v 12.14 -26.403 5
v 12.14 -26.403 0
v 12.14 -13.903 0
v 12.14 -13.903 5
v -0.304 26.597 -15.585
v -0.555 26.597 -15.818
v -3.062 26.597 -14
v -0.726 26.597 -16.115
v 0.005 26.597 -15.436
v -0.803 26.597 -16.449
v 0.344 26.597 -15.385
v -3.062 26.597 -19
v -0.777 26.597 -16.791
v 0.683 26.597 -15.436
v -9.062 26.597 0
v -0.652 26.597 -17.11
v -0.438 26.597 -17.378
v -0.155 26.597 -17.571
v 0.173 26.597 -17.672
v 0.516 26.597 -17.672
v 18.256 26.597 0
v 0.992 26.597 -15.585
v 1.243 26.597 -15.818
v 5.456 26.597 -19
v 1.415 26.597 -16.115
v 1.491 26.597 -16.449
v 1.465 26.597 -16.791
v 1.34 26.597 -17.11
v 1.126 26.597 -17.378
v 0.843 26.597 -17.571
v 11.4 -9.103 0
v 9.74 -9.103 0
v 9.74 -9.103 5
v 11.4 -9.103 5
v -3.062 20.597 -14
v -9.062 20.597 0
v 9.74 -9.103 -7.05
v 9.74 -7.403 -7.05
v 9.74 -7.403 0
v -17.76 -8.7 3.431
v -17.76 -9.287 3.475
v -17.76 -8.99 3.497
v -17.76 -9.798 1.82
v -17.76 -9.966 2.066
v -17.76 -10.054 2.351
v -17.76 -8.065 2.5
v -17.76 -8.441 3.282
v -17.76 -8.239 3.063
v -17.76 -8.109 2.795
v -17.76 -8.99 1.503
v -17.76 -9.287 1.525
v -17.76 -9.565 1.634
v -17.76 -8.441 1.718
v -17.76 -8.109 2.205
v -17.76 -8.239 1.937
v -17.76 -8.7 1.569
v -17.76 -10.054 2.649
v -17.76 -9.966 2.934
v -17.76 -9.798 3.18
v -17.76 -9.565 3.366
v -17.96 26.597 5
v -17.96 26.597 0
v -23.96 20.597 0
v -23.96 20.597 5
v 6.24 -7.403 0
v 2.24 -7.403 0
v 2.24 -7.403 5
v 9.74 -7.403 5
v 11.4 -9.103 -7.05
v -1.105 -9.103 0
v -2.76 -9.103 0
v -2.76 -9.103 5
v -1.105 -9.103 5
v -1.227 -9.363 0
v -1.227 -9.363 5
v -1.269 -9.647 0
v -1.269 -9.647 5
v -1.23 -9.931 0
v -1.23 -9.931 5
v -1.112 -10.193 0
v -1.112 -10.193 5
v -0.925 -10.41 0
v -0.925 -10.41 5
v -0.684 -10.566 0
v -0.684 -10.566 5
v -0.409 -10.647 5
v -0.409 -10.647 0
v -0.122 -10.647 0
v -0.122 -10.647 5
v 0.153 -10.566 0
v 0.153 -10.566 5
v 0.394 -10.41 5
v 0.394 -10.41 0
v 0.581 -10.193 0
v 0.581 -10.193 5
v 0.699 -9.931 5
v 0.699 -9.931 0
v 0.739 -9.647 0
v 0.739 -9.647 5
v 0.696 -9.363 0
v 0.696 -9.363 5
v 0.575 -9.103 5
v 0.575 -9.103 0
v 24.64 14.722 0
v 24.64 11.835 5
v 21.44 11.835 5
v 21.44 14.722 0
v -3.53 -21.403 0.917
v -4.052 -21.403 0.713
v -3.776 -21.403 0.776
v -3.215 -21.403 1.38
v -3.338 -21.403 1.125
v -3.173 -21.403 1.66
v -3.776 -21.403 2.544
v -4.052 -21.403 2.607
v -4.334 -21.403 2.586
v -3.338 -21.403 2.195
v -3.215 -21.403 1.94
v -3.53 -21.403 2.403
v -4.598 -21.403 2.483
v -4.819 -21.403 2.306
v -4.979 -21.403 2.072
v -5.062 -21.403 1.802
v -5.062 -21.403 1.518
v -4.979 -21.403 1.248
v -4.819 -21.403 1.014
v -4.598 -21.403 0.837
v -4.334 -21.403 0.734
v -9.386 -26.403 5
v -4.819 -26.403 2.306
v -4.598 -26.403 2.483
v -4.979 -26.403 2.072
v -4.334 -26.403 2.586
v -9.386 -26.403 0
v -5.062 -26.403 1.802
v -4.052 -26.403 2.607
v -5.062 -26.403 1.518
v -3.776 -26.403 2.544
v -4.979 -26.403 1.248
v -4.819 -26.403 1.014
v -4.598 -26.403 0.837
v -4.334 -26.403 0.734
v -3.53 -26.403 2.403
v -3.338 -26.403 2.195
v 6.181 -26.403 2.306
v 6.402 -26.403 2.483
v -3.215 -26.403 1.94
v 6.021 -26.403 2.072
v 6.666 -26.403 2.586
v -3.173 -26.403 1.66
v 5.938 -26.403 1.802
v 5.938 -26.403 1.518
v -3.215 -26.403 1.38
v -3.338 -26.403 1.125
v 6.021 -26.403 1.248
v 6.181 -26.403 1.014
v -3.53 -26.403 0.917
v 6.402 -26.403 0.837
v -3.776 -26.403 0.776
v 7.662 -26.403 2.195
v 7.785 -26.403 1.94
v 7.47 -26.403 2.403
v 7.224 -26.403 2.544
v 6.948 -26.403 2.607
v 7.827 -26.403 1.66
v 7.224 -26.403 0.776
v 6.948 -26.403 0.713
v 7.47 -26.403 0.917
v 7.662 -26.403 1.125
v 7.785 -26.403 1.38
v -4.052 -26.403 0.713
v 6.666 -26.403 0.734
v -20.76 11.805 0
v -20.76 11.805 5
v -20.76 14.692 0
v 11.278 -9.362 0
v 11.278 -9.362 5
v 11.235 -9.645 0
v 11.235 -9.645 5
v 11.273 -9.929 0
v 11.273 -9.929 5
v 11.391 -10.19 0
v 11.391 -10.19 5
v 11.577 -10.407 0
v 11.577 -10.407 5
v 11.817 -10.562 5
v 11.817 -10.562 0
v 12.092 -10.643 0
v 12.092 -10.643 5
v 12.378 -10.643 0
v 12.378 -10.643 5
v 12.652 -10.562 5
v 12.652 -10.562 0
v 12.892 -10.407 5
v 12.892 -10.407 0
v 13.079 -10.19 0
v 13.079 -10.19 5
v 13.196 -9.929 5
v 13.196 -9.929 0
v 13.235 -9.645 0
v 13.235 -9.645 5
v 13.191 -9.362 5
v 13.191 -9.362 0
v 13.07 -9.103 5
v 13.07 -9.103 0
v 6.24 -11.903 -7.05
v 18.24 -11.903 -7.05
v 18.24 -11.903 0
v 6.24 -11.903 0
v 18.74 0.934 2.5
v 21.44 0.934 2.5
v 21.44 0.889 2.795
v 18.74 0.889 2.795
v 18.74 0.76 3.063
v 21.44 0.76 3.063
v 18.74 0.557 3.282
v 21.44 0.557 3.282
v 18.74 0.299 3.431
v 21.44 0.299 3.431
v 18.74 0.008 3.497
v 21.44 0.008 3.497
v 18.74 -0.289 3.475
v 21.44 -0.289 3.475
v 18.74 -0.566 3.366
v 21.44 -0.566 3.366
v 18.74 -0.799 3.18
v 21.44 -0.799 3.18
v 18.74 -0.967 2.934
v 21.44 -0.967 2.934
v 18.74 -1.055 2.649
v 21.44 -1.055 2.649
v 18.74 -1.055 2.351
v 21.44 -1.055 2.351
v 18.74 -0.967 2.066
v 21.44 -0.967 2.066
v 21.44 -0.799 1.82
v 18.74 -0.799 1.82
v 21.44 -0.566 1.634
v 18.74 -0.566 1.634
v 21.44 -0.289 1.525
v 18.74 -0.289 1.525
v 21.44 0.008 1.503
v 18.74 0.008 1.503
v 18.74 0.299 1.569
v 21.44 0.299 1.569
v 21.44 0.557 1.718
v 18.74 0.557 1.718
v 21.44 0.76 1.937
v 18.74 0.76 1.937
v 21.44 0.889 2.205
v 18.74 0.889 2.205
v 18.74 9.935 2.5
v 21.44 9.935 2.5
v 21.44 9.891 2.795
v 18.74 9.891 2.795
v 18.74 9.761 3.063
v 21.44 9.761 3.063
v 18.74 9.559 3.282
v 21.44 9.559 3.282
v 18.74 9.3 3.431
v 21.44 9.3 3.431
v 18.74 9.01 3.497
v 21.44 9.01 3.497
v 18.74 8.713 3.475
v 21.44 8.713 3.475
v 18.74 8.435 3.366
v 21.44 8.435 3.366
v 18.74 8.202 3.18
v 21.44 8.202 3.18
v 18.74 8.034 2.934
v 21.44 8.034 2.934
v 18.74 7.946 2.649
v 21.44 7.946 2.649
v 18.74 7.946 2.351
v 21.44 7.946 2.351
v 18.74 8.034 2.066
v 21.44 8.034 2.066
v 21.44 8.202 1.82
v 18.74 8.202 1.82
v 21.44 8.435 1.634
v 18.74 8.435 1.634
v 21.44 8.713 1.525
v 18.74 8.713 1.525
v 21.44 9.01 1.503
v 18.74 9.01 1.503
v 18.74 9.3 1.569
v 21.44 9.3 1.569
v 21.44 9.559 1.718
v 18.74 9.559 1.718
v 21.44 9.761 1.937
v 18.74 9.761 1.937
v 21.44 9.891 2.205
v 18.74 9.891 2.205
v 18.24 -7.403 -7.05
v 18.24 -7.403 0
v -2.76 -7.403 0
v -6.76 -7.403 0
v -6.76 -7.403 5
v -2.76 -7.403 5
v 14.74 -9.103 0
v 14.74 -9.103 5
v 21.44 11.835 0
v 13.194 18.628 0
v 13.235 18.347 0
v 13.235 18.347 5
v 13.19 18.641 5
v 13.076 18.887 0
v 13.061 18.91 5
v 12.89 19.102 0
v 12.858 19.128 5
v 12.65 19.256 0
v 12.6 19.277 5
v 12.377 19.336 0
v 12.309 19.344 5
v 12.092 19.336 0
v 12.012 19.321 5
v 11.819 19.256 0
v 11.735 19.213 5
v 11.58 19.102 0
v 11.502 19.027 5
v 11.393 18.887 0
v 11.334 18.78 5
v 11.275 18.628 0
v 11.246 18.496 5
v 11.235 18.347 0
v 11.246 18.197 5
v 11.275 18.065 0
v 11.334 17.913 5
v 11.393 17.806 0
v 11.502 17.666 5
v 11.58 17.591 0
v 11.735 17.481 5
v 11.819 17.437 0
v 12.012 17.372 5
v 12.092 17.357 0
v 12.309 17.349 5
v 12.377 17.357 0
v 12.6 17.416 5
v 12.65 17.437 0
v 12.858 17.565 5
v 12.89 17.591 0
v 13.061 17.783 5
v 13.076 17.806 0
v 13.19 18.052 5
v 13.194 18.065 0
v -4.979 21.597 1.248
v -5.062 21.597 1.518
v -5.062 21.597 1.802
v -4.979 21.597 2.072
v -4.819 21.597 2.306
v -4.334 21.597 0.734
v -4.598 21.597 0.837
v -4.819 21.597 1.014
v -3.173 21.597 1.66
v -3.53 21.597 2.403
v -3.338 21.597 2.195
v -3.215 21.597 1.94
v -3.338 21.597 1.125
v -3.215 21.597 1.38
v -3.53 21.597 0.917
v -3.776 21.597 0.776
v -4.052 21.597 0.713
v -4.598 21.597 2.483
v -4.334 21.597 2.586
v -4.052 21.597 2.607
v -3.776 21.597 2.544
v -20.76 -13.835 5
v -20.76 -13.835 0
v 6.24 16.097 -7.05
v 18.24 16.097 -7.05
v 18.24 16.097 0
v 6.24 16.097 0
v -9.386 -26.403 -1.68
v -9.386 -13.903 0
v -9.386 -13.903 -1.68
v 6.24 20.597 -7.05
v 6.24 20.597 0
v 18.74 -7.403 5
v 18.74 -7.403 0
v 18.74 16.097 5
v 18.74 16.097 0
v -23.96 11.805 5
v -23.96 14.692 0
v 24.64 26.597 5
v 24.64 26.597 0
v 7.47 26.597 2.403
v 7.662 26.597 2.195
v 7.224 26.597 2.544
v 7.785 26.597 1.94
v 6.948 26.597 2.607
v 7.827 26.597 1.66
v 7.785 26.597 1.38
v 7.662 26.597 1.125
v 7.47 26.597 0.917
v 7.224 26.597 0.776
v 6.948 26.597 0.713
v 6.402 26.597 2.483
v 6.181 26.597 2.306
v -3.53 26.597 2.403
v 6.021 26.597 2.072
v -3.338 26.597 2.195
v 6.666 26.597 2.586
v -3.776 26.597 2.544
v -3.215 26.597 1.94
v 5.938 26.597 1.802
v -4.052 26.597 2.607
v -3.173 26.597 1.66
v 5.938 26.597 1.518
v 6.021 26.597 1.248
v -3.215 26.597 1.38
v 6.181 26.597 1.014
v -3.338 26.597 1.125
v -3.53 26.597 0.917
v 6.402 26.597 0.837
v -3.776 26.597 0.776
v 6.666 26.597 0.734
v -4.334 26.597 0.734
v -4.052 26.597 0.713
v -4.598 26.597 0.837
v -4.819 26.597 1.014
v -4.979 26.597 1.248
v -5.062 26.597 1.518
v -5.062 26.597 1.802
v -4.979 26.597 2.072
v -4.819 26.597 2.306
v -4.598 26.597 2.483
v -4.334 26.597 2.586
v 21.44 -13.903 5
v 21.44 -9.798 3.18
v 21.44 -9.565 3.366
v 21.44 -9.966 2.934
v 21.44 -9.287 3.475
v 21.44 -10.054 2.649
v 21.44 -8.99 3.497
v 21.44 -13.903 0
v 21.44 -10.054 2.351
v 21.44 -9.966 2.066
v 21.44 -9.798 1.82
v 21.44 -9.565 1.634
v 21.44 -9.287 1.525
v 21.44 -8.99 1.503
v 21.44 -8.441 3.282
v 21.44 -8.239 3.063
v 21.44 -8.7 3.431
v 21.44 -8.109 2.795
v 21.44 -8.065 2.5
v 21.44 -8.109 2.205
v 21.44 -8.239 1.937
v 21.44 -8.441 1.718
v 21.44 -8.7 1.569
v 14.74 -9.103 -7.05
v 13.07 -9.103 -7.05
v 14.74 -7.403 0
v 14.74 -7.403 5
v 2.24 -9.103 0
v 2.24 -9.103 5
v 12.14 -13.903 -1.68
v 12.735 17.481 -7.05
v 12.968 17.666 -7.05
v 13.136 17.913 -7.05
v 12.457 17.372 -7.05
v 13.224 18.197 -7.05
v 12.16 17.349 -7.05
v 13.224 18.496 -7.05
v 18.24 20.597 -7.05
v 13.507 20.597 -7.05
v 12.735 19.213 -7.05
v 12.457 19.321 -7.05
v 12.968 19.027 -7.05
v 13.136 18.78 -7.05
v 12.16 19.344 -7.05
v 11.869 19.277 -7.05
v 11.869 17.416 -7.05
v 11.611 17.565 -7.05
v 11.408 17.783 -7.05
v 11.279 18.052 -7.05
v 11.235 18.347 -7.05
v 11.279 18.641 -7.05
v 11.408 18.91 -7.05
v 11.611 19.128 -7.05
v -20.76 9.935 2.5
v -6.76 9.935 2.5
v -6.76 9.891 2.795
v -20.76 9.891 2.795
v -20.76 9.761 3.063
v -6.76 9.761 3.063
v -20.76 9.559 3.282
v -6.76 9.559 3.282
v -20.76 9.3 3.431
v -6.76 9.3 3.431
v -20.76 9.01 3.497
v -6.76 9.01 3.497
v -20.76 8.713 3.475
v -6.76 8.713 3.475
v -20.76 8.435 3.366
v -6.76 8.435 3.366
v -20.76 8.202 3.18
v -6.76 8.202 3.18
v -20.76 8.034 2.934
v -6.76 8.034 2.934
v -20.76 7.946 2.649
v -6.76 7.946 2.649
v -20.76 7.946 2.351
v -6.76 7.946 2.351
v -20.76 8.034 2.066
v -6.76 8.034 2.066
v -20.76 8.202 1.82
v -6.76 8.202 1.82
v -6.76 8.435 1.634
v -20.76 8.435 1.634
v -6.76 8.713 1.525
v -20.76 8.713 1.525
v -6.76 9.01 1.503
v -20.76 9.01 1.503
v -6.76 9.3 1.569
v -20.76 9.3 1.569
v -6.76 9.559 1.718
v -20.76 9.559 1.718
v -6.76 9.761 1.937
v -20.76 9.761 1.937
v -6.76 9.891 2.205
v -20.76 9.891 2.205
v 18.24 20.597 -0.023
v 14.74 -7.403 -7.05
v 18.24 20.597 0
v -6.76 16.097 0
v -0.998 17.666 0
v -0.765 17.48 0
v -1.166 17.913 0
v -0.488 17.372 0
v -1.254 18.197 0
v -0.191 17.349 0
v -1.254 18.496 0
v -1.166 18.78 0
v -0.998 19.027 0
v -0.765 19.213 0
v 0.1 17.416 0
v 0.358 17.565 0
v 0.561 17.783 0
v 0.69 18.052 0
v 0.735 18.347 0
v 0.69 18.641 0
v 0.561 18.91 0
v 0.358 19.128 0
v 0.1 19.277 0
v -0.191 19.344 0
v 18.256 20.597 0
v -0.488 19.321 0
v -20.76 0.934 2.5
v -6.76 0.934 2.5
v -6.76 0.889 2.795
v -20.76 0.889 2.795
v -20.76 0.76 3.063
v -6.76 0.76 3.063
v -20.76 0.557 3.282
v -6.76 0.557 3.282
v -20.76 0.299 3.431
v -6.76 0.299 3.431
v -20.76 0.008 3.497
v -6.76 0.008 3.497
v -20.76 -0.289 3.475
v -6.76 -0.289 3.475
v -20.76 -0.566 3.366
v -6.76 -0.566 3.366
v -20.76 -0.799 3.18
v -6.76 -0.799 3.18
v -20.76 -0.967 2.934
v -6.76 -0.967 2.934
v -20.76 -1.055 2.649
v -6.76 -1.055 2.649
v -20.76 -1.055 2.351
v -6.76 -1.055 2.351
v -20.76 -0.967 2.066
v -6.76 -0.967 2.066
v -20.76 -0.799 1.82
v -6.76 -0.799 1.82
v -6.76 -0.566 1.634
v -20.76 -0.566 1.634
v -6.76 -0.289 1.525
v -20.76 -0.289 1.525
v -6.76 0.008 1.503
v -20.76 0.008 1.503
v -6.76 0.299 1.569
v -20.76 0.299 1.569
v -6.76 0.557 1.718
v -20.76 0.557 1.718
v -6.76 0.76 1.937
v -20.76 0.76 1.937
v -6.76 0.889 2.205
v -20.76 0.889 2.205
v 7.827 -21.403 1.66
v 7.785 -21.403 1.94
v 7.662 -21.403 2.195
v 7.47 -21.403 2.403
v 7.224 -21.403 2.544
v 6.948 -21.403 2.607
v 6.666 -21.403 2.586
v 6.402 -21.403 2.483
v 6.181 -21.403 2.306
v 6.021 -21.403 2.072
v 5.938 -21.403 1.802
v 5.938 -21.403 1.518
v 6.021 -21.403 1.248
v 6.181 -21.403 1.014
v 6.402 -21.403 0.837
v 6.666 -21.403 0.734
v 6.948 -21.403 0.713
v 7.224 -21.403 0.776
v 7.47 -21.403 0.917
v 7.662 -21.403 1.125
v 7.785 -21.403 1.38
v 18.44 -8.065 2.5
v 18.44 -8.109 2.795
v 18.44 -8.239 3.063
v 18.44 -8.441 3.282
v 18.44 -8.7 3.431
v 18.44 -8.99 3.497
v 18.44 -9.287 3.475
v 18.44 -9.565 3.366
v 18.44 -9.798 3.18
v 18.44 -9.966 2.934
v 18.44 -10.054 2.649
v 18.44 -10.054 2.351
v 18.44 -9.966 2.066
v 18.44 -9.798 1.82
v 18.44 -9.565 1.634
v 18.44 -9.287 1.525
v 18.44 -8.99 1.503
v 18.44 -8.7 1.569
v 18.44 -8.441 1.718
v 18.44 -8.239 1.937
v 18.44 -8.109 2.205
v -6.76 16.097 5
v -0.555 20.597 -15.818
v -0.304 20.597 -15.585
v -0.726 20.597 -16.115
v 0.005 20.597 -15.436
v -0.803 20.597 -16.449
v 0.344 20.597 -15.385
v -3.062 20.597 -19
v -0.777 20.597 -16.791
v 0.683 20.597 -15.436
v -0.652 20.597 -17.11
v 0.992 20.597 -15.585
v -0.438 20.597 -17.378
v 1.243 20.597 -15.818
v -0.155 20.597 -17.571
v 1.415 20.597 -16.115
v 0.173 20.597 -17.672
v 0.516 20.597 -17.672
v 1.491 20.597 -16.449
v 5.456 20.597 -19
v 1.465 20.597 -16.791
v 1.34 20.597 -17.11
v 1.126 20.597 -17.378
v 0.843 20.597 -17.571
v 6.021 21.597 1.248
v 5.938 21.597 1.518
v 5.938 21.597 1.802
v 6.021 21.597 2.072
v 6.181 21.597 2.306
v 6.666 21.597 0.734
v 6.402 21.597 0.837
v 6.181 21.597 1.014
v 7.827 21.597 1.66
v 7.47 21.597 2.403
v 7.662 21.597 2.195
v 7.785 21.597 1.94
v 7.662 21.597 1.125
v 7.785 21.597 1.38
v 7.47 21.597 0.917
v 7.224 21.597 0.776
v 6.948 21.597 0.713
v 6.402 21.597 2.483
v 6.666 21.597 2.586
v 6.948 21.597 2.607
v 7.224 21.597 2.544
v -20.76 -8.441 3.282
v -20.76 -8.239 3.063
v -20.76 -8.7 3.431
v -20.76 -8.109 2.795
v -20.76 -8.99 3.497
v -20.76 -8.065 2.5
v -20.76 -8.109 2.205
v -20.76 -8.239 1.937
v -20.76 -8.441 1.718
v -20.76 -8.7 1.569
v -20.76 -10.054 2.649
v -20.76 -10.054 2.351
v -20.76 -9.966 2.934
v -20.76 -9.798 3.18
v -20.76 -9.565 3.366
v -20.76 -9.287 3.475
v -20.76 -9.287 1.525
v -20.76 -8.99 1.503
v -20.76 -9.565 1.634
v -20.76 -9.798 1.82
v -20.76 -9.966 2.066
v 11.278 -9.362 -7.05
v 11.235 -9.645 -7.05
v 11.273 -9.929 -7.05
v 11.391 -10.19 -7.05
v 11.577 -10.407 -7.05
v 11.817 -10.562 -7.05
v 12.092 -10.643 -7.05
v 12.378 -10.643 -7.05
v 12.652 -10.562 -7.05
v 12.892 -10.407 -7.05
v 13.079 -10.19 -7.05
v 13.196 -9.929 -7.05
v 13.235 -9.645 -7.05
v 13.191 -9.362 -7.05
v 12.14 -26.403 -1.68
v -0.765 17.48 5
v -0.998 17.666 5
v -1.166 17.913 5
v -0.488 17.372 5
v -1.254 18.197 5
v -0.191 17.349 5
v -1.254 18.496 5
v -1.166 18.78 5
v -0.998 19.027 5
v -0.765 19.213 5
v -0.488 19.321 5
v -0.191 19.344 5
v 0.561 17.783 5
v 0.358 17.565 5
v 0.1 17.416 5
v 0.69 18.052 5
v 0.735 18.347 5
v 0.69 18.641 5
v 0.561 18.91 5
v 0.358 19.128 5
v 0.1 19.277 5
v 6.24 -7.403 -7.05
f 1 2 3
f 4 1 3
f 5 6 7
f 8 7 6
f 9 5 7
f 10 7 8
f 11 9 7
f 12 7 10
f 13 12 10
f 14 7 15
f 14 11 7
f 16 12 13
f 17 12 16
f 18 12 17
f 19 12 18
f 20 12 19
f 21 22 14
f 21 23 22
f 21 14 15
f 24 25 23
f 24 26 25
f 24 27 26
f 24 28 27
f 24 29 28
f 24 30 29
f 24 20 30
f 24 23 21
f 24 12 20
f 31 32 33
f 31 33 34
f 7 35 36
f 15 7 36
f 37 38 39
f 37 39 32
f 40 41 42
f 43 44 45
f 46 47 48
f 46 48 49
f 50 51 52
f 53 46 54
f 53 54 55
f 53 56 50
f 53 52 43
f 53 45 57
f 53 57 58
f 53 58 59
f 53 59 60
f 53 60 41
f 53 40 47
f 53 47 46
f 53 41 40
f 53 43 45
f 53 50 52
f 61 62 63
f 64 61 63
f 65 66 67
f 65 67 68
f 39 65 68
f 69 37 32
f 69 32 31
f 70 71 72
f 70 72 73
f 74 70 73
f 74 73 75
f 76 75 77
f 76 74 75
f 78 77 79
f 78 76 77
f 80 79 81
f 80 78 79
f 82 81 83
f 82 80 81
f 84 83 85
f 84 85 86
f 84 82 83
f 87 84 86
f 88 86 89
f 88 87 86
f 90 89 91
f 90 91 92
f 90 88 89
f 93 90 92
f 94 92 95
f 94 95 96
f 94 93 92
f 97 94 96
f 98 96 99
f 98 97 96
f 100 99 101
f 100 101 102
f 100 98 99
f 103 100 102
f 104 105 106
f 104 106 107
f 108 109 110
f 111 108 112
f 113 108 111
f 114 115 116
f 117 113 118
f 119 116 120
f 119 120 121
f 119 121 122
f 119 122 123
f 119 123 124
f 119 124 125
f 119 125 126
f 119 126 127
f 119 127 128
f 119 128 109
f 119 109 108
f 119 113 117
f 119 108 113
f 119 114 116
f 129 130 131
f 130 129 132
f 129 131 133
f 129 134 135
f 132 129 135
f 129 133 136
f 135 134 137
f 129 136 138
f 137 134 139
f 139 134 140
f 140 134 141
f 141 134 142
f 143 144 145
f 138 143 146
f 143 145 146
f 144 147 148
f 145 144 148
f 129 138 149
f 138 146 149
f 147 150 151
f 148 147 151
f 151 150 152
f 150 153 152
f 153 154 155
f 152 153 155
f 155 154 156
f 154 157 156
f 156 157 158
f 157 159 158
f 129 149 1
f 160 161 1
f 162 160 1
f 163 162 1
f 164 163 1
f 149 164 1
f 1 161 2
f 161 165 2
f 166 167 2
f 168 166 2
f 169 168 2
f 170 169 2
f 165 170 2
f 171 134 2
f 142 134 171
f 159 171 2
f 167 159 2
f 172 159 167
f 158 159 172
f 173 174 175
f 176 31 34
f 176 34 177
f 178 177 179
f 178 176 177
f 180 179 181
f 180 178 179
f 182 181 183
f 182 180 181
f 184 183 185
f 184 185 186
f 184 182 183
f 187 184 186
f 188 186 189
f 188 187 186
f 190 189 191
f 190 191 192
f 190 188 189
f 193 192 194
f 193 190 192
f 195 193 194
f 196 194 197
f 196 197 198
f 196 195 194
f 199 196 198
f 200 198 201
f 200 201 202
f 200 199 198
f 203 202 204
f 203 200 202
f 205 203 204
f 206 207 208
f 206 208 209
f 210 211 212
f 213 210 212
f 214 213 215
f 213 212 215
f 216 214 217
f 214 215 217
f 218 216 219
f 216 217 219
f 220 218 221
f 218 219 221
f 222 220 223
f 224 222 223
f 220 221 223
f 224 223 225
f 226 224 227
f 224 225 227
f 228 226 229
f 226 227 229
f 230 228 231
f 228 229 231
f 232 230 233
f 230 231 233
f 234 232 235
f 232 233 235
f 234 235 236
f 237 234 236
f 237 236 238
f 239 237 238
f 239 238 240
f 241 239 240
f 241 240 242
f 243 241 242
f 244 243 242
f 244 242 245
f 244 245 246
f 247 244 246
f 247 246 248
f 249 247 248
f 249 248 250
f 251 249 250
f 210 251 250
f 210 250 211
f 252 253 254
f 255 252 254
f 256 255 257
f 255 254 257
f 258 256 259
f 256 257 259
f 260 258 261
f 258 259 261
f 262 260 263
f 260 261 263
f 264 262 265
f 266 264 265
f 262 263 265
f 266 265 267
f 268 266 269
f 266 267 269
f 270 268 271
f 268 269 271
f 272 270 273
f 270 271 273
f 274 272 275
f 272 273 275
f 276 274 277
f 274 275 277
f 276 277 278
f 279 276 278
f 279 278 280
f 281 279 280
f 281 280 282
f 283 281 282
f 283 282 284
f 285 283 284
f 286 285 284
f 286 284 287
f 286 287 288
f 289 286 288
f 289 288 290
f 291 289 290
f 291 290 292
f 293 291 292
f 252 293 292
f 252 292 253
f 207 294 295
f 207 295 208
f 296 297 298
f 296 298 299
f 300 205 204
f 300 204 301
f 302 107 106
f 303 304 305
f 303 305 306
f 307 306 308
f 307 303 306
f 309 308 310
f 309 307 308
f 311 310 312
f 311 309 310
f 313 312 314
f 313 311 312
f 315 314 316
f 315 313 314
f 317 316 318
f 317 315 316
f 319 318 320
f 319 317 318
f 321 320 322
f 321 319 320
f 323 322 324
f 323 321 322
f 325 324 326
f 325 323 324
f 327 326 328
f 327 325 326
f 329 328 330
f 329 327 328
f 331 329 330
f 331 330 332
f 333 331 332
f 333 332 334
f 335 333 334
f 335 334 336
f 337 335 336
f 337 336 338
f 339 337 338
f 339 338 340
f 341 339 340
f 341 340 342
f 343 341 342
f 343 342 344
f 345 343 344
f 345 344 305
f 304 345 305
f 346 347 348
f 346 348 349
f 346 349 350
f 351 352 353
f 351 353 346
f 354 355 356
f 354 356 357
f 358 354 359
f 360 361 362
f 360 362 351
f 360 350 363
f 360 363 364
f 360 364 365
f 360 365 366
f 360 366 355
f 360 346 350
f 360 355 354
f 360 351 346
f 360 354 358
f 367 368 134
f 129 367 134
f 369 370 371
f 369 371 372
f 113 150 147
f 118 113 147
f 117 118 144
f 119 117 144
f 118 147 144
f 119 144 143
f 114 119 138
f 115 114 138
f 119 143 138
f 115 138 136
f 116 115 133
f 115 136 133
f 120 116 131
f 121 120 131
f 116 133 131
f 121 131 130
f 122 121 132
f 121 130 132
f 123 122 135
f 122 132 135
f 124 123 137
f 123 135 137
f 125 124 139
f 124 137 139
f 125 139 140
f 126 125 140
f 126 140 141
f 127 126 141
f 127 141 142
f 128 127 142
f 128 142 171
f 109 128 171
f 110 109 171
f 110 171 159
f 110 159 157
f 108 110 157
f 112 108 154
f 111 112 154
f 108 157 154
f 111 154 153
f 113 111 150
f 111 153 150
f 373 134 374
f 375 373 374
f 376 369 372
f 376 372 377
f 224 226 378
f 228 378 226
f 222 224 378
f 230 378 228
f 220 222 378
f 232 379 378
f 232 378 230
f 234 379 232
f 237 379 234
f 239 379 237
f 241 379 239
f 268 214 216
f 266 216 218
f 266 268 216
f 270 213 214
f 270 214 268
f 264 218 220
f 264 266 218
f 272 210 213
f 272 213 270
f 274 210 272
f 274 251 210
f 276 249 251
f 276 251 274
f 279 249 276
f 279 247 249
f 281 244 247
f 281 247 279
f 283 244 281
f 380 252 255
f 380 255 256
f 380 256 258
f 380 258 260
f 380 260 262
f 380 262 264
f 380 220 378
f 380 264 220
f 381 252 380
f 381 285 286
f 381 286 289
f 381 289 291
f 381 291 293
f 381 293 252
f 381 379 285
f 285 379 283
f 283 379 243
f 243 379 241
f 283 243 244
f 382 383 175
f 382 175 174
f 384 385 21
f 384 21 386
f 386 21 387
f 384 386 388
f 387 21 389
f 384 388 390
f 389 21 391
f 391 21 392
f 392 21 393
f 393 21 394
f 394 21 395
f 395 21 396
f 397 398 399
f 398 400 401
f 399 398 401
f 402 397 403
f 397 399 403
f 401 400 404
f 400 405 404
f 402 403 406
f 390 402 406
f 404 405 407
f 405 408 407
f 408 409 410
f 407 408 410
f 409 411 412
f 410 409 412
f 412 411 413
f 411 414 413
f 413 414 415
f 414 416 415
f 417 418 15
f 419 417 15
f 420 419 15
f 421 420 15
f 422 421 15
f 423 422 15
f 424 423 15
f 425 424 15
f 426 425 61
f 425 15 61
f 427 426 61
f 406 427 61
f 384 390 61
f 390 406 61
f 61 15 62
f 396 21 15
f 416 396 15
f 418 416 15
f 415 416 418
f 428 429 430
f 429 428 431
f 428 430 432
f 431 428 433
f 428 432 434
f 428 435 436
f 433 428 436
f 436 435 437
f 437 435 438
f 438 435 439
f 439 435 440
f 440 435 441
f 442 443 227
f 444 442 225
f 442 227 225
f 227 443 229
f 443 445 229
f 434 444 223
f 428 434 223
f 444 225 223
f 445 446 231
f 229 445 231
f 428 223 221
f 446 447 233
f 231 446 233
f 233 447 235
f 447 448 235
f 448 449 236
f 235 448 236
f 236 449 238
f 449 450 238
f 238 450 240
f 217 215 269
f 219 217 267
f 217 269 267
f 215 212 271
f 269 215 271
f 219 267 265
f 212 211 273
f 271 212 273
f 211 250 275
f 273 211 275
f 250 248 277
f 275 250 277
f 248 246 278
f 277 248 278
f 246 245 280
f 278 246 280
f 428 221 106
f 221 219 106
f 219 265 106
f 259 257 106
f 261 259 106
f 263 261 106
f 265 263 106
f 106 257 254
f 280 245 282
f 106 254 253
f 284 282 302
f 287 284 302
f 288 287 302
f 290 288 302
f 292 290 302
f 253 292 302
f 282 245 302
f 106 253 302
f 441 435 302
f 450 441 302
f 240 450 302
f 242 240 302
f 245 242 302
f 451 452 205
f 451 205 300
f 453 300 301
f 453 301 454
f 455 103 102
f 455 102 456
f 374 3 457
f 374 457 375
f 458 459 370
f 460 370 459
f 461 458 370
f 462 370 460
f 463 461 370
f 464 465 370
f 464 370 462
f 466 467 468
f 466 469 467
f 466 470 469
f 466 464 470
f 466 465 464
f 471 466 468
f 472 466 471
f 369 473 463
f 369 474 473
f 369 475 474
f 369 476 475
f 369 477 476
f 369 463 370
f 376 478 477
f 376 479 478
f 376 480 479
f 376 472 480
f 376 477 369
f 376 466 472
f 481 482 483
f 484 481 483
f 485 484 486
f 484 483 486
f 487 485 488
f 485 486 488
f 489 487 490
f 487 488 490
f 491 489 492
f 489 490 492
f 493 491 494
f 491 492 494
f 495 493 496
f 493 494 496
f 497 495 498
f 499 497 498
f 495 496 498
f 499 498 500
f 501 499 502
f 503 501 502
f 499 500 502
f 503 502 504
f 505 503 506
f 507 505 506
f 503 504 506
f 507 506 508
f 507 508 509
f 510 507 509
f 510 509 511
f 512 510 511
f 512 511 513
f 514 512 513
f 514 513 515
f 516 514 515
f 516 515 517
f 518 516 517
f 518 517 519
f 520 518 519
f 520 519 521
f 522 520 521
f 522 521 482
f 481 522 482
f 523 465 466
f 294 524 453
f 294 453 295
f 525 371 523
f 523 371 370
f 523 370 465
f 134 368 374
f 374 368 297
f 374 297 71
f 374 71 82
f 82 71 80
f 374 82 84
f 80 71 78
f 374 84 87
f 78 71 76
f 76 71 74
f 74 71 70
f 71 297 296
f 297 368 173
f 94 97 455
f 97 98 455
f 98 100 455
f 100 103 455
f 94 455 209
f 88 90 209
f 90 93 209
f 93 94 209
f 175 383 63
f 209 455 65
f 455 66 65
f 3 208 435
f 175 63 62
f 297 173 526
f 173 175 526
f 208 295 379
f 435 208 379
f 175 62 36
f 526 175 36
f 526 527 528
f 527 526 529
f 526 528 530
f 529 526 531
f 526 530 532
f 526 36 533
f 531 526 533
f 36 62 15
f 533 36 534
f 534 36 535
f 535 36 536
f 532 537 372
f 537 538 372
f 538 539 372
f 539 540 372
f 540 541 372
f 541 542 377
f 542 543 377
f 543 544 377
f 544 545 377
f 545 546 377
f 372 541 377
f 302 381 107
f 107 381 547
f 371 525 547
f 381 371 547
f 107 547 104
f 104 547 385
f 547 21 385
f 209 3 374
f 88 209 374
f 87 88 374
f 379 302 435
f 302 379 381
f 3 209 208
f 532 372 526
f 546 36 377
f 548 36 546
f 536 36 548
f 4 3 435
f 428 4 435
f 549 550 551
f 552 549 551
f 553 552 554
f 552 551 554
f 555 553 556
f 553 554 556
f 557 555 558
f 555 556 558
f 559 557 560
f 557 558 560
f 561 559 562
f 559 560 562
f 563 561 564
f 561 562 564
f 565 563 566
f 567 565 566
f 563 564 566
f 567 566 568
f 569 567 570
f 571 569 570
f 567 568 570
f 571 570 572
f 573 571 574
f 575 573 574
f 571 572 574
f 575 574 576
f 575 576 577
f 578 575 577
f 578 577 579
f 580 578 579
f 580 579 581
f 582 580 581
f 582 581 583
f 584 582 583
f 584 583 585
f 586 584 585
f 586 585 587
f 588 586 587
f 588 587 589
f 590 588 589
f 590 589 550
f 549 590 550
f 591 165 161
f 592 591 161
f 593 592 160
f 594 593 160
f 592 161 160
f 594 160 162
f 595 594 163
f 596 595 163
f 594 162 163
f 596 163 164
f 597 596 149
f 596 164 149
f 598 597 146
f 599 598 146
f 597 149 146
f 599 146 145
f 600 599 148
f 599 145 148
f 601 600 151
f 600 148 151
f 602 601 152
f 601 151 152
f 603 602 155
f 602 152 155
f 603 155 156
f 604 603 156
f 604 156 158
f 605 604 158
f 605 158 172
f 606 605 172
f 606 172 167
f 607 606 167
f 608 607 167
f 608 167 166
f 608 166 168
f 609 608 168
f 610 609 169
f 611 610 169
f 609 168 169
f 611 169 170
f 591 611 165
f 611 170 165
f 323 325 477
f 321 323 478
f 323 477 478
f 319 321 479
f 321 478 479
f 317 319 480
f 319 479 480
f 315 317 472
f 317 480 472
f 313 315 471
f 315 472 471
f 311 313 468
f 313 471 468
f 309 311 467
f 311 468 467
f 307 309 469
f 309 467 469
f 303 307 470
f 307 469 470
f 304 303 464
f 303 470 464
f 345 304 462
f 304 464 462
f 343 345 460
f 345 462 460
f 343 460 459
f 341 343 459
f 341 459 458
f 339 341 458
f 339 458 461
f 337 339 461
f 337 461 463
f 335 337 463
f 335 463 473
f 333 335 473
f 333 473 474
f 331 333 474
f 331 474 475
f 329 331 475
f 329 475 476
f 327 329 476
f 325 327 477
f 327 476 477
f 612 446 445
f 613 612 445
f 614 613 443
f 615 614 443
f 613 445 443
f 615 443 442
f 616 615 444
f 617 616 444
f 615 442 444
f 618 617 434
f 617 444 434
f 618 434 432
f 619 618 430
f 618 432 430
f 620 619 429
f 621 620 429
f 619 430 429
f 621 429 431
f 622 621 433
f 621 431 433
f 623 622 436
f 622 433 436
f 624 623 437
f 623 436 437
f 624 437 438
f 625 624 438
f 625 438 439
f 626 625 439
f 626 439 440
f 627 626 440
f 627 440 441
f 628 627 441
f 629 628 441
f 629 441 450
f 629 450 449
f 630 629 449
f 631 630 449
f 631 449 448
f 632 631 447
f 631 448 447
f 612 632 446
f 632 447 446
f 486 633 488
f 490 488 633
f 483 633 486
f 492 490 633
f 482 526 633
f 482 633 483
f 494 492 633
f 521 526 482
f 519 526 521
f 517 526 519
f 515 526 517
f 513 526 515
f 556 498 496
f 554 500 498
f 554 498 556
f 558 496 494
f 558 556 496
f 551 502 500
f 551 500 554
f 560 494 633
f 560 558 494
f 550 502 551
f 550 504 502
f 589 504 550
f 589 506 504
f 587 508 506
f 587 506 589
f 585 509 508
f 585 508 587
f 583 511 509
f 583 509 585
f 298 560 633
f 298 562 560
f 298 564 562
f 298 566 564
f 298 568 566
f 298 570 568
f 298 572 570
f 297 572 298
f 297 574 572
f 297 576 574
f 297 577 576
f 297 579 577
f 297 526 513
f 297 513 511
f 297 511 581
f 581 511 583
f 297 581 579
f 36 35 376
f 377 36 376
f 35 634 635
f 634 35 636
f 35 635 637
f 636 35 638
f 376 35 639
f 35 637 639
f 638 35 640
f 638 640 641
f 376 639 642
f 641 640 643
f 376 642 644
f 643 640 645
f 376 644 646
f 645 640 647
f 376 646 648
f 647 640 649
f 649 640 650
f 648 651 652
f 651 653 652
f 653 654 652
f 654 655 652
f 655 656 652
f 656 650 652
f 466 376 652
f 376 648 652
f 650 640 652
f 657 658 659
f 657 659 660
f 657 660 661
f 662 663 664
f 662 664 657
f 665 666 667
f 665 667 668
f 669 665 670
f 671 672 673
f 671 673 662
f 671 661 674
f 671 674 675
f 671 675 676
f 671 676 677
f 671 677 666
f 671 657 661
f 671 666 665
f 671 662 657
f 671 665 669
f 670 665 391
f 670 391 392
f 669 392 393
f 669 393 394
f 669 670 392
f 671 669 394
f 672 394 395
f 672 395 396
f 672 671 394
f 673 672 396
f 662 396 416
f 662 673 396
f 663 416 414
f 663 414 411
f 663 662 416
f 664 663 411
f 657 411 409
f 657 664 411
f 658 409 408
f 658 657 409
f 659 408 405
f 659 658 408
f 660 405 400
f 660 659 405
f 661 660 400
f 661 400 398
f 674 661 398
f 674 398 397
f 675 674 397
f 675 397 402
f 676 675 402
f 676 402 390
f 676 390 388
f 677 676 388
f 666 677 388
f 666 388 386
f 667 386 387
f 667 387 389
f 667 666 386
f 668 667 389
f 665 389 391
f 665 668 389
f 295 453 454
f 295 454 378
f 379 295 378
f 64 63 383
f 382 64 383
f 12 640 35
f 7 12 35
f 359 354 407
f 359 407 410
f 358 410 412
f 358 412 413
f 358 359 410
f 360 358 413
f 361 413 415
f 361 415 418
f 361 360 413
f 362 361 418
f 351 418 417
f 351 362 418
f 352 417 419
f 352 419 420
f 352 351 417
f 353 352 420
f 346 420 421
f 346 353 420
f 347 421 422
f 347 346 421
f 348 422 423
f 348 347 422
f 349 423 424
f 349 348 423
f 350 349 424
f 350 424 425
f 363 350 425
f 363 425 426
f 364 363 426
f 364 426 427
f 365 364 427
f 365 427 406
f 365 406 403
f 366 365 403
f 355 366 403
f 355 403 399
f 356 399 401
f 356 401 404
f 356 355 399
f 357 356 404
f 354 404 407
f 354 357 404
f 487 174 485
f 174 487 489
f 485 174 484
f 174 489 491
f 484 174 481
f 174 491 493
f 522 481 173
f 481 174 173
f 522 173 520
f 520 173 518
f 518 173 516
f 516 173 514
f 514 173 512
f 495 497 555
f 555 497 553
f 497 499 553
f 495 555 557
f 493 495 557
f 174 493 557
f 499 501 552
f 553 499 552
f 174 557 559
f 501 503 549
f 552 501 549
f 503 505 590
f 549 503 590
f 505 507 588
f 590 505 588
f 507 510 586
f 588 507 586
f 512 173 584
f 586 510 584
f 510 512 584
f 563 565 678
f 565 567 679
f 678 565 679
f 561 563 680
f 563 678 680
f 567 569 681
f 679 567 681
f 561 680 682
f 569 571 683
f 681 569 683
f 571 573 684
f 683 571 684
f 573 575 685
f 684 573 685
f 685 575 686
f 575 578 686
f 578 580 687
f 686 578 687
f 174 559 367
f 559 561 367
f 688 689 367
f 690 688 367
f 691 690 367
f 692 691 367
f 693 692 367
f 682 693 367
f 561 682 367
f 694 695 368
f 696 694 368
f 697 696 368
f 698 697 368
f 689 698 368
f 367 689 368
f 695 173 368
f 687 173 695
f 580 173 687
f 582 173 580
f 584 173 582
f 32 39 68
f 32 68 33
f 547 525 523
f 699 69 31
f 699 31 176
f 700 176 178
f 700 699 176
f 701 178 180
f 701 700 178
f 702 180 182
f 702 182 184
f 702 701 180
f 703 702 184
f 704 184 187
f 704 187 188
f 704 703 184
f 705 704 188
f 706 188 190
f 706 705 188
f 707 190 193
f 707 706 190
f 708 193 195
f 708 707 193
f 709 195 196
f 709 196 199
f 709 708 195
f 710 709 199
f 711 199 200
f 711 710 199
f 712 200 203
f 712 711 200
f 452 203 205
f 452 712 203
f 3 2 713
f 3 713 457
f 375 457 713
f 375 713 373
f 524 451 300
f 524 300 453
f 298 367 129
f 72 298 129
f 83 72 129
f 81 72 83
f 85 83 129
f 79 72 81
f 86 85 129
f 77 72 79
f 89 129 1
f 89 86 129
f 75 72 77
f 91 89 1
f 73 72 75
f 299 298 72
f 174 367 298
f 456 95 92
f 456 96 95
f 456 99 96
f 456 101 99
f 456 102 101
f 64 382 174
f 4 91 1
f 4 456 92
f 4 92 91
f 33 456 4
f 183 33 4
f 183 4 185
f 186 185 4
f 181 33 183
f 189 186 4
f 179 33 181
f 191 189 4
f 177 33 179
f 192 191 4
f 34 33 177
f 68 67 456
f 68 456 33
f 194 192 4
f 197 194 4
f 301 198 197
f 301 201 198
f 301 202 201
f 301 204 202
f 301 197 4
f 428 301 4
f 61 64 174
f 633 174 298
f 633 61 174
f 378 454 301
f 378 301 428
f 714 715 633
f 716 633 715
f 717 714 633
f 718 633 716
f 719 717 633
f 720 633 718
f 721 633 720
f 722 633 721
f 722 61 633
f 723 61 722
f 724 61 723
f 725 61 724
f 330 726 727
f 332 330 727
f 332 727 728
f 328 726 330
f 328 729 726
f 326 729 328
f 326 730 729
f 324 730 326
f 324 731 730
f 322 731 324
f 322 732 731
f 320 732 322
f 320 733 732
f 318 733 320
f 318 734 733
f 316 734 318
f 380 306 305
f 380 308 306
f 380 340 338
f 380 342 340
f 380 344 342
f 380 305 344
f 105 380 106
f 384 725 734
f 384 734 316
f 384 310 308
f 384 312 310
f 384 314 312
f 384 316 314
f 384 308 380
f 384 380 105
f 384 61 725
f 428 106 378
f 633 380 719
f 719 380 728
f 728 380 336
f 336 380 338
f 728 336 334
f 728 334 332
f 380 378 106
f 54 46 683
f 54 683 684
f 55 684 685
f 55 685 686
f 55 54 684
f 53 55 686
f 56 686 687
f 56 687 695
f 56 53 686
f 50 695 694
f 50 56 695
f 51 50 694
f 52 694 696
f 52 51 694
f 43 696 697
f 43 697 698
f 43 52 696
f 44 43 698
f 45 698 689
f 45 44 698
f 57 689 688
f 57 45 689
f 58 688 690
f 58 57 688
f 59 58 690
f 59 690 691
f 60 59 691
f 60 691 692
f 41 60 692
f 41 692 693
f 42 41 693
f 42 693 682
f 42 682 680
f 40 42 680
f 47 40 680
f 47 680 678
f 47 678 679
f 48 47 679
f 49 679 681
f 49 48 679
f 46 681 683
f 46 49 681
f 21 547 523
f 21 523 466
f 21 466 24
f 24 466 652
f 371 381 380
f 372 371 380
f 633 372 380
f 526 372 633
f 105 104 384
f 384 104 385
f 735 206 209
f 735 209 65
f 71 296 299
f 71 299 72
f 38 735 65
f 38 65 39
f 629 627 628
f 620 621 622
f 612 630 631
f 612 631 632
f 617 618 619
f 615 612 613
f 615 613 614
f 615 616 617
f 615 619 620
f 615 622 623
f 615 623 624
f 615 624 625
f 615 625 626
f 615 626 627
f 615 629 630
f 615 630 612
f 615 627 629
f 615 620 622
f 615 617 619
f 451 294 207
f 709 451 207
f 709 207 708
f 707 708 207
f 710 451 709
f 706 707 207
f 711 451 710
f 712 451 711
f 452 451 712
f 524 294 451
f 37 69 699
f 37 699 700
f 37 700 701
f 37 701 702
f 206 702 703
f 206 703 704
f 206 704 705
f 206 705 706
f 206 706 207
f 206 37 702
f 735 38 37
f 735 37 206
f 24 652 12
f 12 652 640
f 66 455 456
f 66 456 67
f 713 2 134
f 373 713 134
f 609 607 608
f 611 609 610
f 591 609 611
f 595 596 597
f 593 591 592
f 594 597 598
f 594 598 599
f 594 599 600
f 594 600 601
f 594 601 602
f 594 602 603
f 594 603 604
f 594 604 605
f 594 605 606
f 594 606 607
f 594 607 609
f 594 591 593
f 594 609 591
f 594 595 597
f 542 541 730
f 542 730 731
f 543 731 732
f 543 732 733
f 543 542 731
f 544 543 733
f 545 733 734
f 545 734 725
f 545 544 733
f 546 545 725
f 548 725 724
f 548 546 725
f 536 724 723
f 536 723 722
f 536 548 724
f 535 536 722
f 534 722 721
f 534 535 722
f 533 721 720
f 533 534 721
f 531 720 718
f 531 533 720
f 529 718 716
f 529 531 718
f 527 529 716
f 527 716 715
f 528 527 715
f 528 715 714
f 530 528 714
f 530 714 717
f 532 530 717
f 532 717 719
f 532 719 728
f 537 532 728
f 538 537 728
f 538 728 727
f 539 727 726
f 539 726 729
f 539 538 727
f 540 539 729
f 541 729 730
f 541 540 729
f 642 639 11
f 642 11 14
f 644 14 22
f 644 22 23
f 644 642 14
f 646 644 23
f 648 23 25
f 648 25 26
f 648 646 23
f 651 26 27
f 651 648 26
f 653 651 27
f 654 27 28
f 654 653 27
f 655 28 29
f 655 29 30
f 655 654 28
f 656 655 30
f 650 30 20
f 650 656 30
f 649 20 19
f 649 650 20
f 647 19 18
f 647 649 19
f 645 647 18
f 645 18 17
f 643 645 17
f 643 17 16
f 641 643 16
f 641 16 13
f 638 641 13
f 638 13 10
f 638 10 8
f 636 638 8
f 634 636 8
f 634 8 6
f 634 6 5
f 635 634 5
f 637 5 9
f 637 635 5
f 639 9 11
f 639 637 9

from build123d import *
from build123d.topology import SkipClean

# Parameters (mm, degrees)
SKETCH_1_R          = 1.000029699
SKETCH_1_R_2        = 1.000000092
EXTRUDE_1_DEPTH     = 5
EXTRUDE_START       = 7.05
SKETCH_2_W          = 12
SKETCH_2_H          = 4.5
SKETCH_2_R          = 1.000000092
EXTRUDE_2_DEPTH     = 7.05
SKETCH_3_W          = 21.526040124
SKETCH_3_H          = 12.5
EXTRUDE_3_DEPTH     = 1.68
SKETCH_4_R          = 0.95
CUT_EXTRUDE_1_DEPTH = 5
SKETCH_5_R          = 1.149999977
EXTRUDE_4_DEPTH     = 6
CUT_EXTRUDE_START   = -5
SKETCH_6_R          = 0.95
CUT_EXTRUDE_2_DEPTH = 5
SKETCH_7_R          = 1.000001095
SKETCH_7_R_2        = 0.999998737
CUT_EXTRUDE_3_DEPTH = 100
SKETCH_9_R          = 1
CUT_EXTRUDE_4_DEPTH = 3
CUT_EXTRUDE_START_2 = -3
SKETCH_10_R         = 1
CUT_EXTRUDE_5_DEPTH = 3
CUT_EXTRUDE_6_DEPTH = 3.2
CUT_EXTRUDE_7_DEPTH = 3.2


with BuildPart() as part:
    # 草图1 → 凸台-拉伸1 (new body)
    with BuildSketch(Plane.XY):
        Polygon((21.440408464, 11.835070794), (24.640408464, 11.835070794), (24.640408464, 26.596532095), (-17.959592209, 26.596532095), (-23.959592393, 20.596531911), (-23.959592393, 11.805155949), (-20.759591536, 11.805155949), (-20.759591536, -13.834684697), (-9.38563166, -26.403467905), (12.140408464, -26.403467905), (12.140408464, -13.903467905), (21.440408464, -13.903467905), align=None)
        with Locations((-0.265302528, 18.346532095)):
            Circle(SKETCH_1_R, mode=Mode.SUBTRACT)
        with Locations((12.234697472, 18.346532095)):
            Circle(SKETCH_1_R_2, mode=Mode.SUBTRACT)
        with BuildLine():
            ThreePointArc((11.399532521, -9.103467905), (12.234697472, -10.653468153), (13.069862423, -9.103467905))
            Line((13.069862423, -9.103467905), (14.740408464, -9.103467905))
            Line((14.740408464, -9.103467905), (14.740408464, -7.403467905))
            Line((14.740408464, -7.403467905), (18.740408464, -7.403467905))
            Line((18.740408464, -7.403467905), (18.740408464, 16.096532095))
            Line((18.740408464, 16.096532095), (-6.759591536, 16.096532095))
            Line((-6.759591536, 16.096532095), (-6.759591536, -7.403467905))
            Line((-6.759591536, -7.403467905), (-2.759591536, -7.403467905))
            Line((-2.759591536, -7.403467905), (-2.759591536, -9.103467905))
            Line((-2.759591536, -9.103467905), (-1.105259185, -9.103467905))
            ThreePointArc((-1.105259185, -9.103467905), (-0.265302528, -10.657473475), (0.574654129, -9.103467905))
            Line((0.574654129, -9.103467905), (2.240408464, -9.103467905))
            Line((2.240408464, -9.103467905), (2.240408464, -7.403467905))
            Line((2.240408464, -7.403467905), (9.740408464, -7.403467905))
            Line((9.740408464, -7.403467905), (9.740408464, -9.103467905))
            Line((9.740408464, -9.103467905), (11.399532521, -9.103467905))
        make_face(mode=Mode.SUBTRACT)
    extrude(amount=EXTRUDE_1_DEPTH)

    # 草图2 → 凸台-拉伸2 (add)
    # profile 1 of 2: a face of its own
    with SkipClean():  # the faces are left unmerged after this step: merging them gives an invalid solid
        with BuildSketch(Plane(origin=(0, 0, 0), x_dir=(-1, 0, 0), z_dir=(0, 0, -1)).offset(EXTRUDE_START)):
            with BuildLine():
                Line((-18.240408464, -7.403467905), (-18.240408464, -11.903467905))
                Line((-18.240408464, -11.903467905), (-6.240408464, -11.903467905))
                Line((-6.240408464, -11.903467905), (-6.240408464, -7.403467905))
                Line((-6.240408464, -7.403467905), (-9.740408464, -7.403467905))
                Line((-9.740408464, -7.403467905), (-9.740408464, -9.103467905))
                Line((-9.740408464, -9.103467905), (-11.399532521, -9.103467905))
                ThreePointArc((-11.399532521, -9.103467905), (-12.234697472, -10.653468153), (-13.069862423, -9.103467905))
                Line((-13.069862423, -9.103467905), (-14.740408464, -9.103467905))
                Line((-14.740408464, -9.103467905), (-14.740408464, -7.403467905))
                Line((-14.740408464, -7.403467905), (-18.240408464, -7.403467905))
            make_face()
        # profile 2 of 2: a face of its own
        with BuildSketch(Plane(origin=(0, 0, 0), x_dir=(-1, 0, 0), z_dir=(0, 0, -1)).offset(EXTRUDE_START)):
            with Locations((-12.240408464, 18.346532095)):
                Rectangle(SKETCH_2_W, SKETCH_2_H)
            with Locations((-12.234697472, 18.346532095)):
                Circle(SKETCH_2_R, mode=Mode.SUBTRACT)
        extrude(amount=-EXTRUDE_2_DEPTH)

    # 草图3 → 凸台-拉伸3 (add)
    with SkipClean():  # the faces are left unmerged after this step: merging them gives an invalid solid
        with BuildSketch(Plane(origin=(0, 0, 0), x_dir=(-1, 0, 0), z_dir=(0, 0, -1))):
            with Locations((-1.377388402, -20.153467905)):
                Rectangle(SKETCH_3_W, SKETCH_3_H)
        extrude(amount=EXTRUDE_3_DEPTH)

    # 草图4 → 切除-拉伸1 (cut)
    with SkipClean():  # the faces are left unmerged after this step: merging them gives an invalid solid
        with BuildSketch(Plane.XZ.offset(26.403467905)):
            with Locations((6.877388402, 1.66)):
                Circle(SKETCH_4_R)
            with Locations((-4.122611598, 1.66)):
                Circle(SKETCH_4_R)
        extrude(amount=-CUT_EXTRUDE_1_DEPTH, mode=Mode.SUBTRACT)

    # 草图5 → 凸台-拉伸4 (add)
    with SkipClean():  # the faces are left unmerged after this step: merging them gives an invalid solid
        with BuildSketch(Plane(origin=(0, 20.596532095, 0), x_dir=(1, 0, 0), z_dir=(0, 1, 0))):
            Polygon((18.256022121, 0), (5.456022884, 18.999999285), (-3.061941956, 18.999999285), (-3.061941956, 13.999999523), (-9.061942433, 0), align=None)
            with Locations(Location((0.344281244, 16.535050638, 0), (0, 0, 270))):
                Circle(SKETCH_5_R, mode=Mode.SUBTRACT)
        extrude(amount=EXTRUDE_4_DEPTH)

    # 草图6 → 切除-拉伸2 (cut)
    with SkipClean():  # the faces are left unmerged after this step: merging them gives an invalid solid
        with BuildSketch(Plane(origin=(0, 26.596532095, 0), x_dir=(1, 0, 0), z_dir=(0, 1, 0)).offset(CUT_EXTRUDE_START)):
            with Locations((-4.122611598, -1.66)):
                Circle(SKETCH_6_R)
            with Locations((6.877388402, -1.66)):
                Circle(SKETCH_6_R)
        extrude(amount=CUT_EXTRUDE_2_DEPTH, mode=Mode.SUBTRACT)

    # 草图7 → 切除-拉伸3 (cut)
    with SkipClean():  # the faces are left unmerged after this step: merging them gives an invalid solid
        with BuildSketch(Plane(origin=(21.440408464, 0, 0), x_dir=(0, 0, -1), z_dir=(1, 0, 0))):
            with Locations(Location((-2.5, 8.935070794, 0), (0, 0, 90))):
                Circle(SKETCH_7_R)
            with Locations(Location((-2.5, -0.06643386, 0), (0, 0, 90))):
                Circle(SKETCH_7_R_2)
        extrude(amount=-CUT_EXTRUDE_3_DEPTH, mode=Mode.SUBTRACT)

    # 草图9 → 切除-拉伸4 (cut)
    with SkipClean():  # the faces are left unmerged after this step: merging them gives an invalid solid
        with BuildSketch(Plane(origin=(21.440408464, 0, 0), x_dir=(0, 0, -1), z_dir=(1, 0, 0))):
            with Locations(Location((-2.5, -9.064929206, 0), (0, 0, 90))):
                Circle(SKETCH_9_R)
        extrude(amount=-CUT_EXTRUDE_4_DEPTH, mode=Mode.SUBTRACT)

    # 草图10 → 切除-拉伸5 (cut)
    with SkipClean():  # the faces are left unmerged after this step: merging them gives an invalid solid
        with BuildSketch(Plane.ZY.offset(20.759591536).offset(CUT_EXTRUDE_START_2)):
            with Locations(Location((2.5, -9.064929206, 0), (0, 0, 90))):
                Circle(SKETCH_10_R)
        extrude(amount=CUT_EXTRUDE_5_DEPTH, mode=Mode.SUBTRACT)

    # 草图11 → 切除-拉伸6 (cut)
    with SkipClean():  # the faces are left unmerged after this step: merging them gives an invalid solid
        with BuildSketch(Plane(origin=(24.640408464, 0, 0), x_dir=(0, 0, -1), z_dir=(1, 0, 0))):
            Polygon((-5, 11.835070794), (0, 14.72182214), (0, 11.835070794), align=None)
        extrude(amount=-CUT_EXTRUDE_6_DEPTH, mode=Mode.SUBTRACT)

    # 草图12 → 切除-拉伸7 (cut)
    with SkipClean():  # the faces are left unmerged after this step: merging them gives an invalid solid
        with BuildSketch(Plane.ZY.offset(23.959592393)):
            Polygon((5, 11.805155949), (0, 11.805155949), (0, 14.691907295), align=None)
        extrude(amount=-CUT_EXTRUDE_7_DEPTH, mode=Mode.SUBTRACT)


solid = part.part
